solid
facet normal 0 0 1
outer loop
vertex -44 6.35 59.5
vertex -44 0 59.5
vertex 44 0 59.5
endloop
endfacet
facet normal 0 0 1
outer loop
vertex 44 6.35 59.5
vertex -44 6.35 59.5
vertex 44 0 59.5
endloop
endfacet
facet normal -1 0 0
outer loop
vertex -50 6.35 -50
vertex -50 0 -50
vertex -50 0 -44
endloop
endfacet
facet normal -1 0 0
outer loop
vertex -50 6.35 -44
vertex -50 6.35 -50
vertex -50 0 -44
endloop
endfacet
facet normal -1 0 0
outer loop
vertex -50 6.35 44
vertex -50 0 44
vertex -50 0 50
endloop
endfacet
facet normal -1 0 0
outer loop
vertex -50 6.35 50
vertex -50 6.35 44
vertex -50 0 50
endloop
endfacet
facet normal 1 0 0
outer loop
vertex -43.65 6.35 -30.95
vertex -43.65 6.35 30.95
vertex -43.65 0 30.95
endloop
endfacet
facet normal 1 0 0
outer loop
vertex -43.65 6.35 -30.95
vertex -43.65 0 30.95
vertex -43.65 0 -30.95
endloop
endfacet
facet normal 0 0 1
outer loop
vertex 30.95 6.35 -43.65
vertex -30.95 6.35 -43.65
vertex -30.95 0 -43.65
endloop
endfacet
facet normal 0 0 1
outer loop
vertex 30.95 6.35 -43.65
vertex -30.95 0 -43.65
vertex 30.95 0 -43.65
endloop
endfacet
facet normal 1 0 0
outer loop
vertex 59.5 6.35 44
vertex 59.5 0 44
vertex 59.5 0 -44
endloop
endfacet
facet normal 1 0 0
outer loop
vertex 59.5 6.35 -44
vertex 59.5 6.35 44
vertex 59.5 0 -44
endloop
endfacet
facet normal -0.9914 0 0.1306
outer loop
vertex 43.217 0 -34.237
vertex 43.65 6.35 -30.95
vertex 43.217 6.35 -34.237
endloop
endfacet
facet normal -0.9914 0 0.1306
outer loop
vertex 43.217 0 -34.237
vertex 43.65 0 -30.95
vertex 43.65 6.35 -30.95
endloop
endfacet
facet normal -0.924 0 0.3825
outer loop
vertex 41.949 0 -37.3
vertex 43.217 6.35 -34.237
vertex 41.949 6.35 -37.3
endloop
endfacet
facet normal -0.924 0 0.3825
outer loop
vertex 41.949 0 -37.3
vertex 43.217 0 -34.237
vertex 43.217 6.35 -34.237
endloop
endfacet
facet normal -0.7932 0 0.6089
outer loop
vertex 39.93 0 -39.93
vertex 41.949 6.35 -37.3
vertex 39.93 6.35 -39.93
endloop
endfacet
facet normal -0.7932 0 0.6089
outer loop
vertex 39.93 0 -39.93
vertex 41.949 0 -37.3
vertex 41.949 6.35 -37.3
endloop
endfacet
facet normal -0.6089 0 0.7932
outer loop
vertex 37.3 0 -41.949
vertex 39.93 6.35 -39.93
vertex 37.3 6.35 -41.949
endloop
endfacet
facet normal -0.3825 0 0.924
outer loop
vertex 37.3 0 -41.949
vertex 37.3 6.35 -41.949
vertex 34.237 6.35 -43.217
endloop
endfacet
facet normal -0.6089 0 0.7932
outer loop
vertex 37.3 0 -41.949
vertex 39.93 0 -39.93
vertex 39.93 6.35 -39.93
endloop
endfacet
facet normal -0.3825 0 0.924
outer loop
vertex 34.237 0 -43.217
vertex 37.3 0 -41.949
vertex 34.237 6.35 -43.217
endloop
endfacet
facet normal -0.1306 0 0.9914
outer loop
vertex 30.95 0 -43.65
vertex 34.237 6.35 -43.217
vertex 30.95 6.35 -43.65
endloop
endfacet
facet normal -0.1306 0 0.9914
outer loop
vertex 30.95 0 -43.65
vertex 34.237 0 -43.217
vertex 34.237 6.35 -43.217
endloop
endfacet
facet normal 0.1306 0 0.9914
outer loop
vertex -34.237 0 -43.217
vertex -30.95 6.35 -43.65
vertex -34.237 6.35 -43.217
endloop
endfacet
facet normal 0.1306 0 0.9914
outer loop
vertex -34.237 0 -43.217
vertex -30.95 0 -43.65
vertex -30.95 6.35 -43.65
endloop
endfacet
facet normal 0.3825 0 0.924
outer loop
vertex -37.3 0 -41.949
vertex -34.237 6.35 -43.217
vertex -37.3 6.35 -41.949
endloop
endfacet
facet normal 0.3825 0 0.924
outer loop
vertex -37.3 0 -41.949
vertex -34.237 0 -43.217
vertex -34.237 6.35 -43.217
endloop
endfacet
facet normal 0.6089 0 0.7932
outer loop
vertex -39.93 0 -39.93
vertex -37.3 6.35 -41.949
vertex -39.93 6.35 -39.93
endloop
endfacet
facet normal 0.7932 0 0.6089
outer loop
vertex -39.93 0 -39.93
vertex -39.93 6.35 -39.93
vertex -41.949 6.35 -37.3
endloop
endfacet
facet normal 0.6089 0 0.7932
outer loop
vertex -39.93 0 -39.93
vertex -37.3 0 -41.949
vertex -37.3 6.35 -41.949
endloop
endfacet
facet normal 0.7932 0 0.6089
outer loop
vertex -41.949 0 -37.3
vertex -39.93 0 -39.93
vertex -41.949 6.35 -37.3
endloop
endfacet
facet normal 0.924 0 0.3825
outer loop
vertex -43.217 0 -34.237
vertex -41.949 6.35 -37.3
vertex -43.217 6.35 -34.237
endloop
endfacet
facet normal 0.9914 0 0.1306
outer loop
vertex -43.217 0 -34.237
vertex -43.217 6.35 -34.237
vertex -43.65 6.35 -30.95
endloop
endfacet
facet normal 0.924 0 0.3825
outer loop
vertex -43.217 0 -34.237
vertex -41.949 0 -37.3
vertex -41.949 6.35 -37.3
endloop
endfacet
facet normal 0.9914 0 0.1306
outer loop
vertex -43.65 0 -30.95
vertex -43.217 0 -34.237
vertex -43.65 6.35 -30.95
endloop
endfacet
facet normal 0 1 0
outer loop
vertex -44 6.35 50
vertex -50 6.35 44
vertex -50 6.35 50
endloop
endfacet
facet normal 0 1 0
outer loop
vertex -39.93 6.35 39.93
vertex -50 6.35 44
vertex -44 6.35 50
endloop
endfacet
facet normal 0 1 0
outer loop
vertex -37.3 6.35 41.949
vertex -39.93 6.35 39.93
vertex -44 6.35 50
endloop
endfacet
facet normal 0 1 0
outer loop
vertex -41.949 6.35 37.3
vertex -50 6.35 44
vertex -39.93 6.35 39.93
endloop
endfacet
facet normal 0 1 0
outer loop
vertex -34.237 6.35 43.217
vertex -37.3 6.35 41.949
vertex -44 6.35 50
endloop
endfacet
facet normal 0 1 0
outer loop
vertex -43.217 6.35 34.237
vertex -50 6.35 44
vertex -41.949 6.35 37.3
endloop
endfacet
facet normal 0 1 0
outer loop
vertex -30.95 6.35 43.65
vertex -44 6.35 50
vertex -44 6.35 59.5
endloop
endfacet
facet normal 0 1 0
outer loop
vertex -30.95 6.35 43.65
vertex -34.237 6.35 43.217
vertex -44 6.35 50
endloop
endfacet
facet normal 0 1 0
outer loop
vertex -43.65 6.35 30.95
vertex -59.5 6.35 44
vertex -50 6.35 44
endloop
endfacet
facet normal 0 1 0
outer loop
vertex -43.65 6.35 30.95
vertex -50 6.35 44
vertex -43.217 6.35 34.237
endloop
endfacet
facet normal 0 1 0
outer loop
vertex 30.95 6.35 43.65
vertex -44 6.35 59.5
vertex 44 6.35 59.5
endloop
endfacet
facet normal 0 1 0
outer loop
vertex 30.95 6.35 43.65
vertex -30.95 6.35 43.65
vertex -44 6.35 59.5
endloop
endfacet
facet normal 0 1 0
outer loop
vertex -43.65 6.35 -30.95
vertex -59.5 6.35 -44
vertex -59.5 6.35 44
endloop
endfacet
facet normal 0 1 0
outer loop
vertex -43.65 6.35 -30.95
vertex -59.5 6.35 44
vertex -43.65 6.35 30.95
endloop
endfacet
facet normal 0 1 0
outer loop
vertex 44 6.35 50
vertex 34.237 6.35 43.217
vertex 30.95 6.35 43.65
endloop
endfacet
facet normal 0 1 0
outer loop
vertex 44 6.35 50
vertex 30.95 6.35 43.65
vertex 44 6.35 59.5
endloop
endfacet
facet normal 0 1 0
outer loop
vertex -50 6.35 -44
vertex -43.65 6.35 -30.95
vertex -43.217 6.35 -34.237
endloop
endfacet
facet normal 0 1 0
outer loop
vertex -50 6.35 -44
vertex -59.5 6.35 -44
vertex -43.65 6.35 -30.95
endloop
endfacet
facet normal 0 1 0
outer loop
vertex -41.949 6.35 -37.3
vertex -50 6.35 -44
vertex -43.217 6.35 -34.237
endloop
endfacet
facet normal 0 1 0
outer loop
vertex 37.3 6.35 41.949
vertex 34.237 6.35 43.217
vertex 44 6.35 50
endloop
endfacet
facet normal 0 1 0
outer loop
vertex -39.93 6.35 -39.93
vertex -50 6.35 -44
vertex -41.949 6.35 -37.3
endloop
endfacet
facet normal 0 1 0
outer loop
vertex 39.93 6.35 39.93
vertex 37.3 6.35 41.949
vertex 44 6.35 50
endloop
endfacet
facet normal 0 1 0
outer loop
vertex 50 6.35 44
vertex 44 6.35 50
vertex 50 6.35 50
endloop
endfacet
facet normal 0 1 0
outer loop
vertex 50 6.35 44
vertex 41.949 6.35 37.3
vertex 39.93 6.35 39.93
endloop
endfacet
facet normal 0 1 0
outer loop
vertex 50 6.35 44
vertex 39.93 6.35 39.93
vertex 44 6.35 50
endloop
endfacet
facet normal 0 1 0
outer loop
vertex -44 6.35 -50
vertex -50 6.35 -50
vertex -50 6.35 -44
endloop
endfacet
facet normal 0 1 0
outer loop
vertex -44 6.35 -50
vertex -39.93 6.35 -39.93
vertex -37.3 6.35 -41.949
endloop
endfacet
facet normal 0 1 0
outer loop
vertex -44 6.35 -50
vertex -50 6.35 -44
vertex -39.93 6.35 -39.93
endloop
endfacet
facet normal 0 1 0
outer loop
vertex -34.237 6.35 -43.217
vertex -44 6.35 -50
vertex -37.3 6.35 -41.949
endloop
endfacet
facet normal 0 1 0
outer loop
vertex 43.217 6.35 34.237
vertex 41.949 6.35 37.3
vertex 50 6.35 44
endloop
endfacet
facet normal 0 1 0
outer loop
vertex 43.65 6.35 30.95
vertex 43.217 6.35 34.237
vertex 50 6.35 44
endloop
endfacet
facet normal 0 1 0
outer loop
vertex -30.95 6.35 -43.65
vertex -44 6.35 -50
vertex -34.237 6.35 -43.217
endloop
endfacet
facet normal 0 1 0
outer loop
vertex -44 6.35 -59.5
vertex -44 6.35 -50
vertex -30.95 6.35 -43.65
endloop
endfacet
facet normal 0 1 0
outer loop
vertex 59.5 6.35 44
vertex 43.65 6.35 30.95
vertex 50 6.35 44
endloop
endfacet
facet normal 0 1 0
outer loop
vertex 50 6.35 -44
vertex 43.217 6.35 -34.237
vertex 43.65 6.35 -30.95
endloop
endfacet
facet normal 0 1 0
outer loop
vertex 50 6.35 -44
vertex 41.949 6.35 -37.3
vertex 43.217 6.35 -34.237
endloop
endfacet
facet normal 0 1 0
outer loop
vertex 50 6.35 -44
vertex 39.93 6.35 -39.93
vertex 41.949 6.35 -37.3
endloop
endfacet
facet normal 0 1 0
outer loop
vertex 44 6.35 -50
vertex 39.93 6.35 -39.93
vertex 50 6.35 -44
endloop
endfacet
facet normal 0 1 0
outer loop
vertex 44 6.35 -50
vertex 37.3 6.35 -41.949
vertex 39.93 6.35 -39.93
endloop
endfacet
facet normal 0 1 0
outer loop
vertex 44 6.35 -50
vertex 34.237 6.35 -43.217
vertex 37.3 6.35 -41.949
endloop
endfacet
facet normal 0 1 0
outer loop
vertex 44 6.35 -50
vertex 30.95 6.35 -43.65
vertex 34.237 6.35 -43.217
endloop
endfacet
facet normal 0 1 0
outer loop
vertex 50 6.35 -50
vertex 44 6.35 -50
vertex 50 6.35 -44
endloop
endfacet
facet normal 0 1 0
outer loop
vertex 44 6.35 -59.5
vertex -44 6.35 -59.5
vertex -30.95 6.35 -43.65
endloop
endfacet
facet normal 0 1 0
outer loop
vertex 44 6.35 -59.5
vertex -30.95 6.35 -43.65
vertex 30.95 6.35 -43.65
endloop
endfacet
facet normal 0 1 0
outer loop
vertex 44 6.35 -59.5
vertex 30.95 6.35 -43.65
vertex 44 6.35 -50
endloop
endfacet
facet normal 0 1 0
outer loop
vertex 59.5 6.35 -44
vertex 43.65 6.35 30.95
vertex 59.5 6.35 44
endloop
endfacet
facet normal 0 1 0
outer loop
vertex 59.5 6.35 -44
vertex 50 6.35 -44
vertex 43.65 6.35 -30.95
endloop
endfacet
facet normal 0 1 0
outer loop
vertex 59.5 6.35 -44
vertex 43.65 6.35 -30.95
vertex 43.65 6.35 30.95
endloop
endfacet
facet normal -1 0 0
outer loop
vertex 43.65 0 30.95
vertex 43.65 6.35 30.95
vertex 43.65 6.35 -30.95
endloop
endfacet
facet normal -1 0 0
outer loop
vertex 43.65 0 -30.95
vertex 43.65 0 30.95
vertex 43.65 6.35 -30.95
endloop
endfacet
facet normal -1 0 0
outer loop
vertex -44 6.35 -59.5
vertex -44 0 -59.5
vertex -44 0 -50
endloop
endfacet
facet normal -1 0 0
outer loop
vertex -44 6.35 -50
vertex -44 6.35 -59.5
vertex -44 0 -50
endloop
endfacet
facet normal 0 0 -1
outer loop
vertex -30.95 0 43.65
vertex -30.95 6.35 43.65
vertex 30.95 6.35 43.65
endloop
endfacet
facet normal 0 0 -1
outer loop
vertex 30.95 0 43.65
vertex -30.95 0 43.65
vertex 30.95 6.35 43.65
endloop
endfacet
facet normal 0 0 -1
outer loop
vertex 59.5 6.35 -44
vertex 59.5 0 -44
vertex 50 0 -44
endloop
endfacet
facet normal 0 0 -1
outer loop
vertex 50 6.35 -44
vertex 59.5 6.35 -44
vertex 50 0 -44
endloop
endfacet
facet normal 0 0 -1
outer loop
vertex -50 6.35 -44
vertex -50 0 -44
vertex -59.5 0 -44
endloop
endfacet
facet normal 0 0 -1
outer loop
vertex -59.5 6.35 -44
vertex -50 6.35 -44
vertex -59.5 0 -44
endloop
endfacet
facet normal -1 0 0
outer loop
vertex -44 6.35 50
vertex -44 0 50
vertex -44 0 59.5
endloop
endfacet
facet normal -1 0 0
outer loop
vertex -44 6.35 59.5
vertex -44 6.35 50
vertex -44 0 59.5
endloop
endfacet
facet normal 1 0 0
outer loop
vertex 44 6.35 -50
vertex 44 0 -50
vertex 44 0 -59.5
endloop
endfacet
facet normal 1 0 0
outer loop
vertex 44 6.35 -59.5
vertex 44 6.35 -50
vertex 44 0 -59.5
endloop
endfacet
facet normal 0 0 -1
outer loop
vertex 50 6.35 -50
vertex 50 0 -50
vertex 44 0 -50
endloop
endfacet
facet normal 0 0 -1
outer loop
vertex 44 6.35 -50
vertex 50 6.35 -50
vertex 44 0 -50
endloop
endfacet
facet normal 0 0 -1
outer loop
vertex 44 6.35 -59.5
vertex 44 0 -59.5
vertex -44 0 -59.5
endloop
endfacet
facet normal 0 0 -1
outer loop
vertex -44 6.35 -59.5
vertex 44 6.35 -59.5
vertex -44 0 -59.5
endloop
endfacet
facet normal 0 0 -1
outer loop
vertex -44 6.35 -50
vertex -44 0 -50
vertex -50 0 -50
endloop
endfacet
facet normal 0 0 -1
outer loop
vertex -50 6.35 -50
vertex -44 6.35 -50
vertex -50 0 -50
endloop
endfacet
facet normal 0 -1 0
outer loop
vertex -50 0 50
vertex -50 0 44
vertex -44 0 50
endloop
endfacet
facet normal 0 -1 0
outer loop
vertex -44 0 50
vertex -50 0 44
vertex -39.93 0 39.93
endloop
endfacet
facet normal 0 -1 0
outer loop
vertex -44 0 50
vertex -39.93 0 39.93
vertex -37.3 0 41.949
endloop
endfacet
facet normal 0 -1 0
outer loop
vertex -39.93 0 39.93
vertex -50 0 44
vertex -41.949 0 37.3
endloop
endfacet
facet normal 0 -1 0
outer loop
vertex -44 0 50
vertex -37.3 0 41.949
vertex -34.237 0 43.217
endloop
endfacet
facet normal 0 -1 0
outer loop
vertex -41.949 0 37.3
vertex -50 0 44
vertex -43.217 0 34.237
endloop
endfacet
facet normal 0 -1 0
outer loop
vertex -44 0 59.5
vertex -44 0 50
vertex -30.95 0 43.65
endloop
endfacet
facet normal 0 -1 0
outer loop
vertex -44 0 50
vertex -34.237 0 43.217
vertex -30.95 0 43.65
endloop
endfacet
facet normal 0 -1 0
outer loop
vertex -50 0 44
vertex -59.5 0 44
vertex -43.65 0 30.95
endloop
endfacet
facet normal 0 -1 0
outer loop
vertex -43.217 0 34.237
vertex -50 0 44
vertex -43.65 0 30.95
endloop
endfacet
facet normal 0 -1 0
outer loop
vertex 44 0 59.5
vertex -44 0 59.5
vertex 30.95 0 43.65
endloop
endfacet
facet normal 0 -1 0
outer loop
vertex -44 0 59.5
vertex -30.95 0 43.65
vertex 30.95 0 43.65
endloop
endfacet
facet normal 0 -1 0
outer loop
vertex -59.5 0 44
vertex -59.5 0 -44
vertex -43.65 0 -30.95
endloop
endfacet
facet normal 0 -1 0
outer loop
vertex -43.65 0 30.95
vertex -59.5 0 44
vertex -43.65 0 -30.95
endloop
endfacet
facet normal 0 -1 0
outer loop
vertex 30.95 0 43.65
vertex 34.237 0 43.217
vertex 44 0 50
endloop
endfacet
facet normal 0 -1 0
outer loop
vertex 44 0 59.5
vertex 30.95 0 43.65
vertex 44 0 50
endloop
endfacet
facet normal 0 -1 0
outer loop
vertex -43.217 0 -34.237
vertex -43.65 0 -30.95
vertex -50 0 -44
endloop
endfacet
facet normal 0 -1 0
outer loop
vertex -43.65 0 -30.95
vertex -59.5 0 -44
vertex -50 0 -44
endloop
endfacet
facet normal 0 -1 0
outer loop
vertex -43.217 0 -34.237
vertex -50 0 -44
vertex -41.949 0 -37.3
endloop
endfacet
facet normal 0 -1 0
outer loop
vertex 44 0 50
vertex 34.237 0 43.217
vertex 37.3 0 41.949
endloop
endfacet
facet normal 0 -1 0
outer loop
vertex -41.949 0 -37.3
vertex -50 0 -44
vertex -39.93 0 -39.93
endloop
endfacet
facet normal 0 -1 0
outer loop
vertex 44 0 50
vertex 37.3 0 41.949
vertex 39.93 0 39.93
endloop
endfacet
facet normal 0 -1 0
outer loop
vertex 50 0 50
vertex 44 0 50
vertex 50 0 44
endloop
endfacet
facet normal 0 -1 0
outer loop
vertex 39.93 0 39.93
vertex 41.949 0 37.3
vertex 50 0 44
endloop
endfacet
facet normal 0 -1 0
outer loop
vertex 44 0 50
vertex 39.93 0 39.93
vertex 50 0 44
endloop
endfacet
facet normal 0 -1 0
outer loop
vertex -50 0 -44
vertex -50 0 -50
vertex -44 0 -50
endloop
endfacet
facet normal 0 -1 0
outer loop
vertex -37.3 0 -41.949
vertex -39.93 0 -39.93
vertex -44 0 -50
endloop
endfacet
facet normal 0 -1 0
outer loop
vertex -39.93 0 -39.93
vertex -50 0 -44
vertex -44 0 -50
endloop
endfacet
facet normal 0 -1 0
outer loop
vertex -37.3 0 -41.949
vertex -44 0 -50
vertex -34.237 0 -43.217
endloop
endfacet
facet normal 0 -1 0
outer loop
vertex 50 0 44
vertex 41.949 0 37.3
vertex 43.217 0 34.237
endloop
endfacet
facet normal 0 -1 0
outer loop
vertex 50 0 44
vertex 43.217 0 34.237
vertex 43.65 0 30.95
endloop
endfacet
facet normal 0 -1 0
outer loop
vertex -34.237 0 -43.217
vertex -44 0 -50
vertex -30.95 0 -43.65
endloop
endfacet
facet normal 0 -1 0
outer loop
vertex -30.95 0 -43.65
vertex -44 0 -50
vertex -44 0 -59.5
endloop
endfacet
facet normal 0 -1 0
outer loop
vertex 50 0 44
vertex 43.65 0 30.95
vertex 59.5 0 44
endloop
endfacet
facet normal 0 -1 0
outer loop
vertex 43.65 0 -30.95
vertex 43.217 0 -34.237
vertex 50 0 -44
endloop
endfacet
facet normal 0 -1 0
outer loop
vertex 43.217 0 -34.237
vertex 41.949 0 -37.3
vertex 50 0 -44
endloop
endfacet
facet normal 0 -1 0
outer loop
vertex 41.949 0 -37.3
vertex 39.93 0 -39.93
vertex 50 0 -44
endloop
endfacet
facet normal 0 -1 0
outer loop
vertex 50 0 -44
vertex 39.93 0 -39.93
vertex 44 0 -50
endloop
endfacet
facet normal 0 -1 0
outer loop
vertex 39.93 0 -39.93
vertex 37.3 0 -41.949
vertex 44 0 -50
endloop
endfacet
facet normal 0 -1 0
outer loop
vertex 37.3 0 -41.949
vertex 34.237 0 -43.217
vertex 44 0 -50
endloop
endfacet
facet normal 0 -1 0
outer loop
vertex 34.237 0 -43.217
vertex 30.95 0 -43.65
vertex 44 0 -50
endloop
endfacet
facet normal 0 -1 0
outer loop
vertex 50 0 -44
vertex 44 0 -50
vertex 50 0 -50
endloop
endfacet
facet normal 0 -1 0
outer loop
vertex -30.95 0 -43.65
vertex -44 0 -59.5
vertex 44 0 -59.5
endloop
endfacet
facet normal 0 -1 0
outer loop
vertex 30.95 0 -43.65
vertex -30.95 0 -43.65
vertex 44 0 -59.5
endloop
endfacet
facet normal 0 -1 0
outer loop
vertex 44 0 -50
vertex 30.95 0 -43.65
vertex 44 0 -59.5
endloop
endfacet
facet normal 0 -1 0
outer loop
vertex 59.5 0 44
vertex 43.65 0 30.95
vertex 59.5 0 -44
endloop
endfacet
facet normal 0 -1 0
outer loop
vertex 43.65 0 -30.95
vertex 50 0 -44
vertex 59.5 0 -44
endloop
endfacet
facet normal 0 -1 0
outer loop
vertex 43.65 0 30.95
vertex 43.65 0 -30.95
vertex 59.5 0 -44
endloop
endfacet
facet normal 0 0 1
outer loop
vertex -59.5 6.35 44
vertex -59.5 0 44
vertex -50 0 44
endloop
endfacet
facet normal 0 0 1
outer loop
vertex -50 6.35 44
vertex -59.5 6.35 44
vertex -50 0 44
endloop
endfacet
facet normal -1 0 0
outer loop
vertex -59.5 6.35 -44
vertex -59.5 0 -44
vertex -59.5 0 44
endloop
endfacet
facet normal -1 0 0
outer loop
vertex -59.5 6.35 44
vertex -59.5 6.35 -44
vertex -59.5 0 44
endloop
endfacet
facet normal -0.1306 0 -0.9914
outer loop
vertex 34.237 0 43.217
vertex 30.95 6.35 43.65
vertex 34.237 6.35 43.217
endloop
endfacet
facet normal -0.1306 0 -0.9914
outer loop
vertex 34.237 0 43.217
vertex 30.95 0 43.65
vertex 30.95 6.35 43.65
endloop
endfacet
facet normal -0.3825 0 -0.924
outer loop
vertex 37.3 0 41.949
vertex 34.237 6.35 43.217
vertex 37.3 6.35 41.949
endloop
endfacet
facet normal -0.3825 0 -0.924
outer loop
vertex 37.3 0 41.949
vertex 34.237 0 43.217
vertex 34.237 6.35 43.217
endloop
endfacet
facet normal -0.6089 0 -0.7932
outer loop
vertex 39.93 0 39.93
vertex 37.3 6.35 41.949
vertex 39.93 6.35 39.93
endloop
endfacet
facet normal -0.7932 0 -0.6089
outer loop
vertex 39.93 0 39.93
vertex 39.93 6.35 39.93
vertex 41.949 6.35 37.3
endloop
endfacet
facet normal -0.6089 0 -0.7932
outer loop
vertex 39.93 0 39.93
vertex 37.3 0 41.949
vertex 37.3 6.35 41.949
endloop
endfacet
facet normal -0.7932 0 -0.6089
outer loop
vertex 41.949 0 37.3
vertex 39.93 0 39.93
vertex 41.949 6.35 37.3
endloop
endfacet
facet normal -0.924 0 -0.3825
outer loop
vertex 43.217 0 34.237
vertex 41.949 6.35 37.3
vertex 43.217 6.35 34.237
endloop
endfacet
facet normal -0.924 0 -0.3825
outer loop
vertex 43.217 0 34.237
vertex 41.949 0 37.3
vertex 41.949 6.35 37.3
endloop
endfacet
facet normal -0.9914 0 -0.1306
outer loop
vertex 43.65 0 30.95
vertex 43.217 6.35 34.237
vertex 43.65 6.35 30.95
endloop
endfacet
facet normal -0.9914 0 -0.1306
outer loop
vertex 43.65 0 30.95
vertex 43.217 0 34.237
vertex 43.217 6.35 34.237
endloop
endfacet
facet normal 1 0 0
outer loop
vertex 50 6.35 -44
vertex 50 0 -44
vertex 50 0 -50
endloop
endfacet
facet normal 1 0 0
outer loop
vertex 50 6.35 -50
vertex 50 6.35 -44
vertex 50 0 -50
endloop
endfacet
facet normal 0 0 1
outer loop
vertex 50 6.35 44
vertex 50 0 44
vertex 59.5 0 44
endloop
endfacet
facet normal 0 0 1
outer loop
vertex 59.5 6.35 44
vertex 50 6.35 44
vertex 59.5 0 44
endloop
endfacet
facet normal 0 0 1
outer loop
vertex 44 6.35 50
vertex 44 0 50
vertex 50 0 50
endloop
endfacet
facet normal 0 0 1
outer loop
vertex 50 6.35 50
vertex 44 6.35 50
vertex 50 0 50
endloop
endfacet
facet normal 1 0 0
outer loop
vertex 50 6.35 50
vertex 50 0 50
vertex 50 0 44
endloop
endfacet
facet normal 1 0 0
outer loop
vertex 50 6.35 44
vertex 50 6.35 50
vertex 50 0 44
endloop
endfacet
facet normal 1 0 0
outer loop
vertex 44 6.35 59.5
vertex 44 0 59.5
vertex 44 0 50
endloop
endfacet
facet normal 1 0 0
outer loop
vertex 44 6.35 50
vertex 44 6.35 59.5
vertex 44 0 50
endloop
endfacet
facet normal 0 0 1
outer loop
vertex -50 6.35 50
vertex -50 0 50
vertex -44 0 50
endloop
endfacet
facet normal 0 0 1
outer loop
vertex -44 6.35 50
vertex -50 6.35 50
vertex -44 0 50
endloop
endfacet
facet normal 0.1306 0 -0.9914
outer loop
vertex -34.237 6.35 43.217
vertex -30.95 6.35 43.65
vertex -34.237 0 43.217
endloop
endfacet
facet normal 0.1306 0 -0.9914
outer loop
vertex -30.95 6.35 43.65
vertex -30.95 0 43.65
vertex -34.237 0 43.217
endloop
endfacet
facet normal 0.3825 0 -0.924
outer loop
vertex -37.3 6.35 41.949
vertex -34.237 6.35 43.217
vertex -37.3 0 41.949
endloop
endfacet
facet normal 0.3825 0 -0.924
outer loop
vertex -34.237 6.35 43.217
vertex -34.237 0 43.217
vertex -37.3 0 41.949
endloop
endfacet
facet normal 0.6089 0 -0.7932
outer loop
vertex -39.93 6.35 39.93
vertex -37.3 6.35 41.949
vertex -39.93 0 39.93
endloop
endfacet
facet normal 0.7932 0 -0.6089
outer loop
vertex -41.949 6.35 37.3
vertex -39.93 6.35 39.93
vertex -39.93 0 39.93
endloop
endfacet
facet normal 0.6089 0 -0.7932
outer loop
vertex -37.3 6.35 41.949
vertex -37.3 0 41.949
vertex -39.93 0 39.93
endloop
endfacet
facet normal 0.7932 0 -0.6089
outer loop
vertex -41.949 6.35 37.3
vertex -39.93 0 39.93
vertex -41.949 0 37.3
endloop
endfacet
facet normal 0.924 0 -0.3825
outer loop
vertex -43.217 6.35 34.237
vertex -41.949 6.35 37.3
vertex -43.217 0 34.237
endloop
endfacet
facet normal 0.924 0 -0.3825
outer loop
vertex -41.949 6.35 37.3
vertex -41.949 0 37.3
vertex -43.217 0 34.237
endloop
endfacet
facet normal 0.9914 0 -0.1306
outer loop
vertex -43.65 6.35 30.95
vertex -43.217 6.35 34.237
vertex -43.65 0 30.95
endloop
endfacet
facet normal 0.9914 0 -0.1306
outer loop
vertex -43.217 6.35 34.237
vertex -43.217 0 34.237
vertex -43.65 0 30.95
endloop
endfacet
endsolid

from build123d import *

# Parameters (mm, degrees)
BOSS_EXTRUDE1_DEPTH = 6.35
SKETCH2_W           = 87.3
SKETCH2_H           = 87.3
CUT_EXTRUDE1_DEPTH  = 6.35
FILLET1_R           = 12.7


with BuildPart() as part:
    # Sketch1 → Boss-Extrude1 (new body)
    with BuildSketch(Plane(origin=(0, 0, 0), x_dir=(1, 0, 0), z_dir=(0, 1, 0))):
        Polygon((-44, 50), (-50, 50), (-50, 44), (-59.5, 44), (-59.5, -44), (-50, -44), (-50, -50), (-44, -50), (-44, -59.5), (44, -59.5), (44, -50), (50, -50), (50, -44), (59.5, -44), (59.5, 44), (50, 44), (50, 50), (44, 50), (44, 59.5), (-44, 59.5), align=None)
    extrude(amount=BOSS_EXTRUDE1_DEPTH)

    # Sketch2 → Cut-Extrude1 (cut)
    with BuildSketch(Plane(origin=(0, 6.35, 0), x_dir=(1, 0, 0), z_dir=(0, 1, 0))):
        Rectangle(SKETCH2_W, SKETCH2_H)
    extrude(amount=-CUT_EXTRUDE1_DEPTH, mode=Mode.SUBTRACT)

    # Fillet1
    fillet1_edges = [part.edges().sort_by_distance(p)[0] for p in [
        (-43.65, 3.175, 43.65),
        (-43.65, 3.175, -43.65),
        (43.65, 3.175, -43.65),
        (43.65, 3.175, 43.65),
    ]]
    fillet(fillet1_edges, radius=FILLET1_R)


solid = part.part
